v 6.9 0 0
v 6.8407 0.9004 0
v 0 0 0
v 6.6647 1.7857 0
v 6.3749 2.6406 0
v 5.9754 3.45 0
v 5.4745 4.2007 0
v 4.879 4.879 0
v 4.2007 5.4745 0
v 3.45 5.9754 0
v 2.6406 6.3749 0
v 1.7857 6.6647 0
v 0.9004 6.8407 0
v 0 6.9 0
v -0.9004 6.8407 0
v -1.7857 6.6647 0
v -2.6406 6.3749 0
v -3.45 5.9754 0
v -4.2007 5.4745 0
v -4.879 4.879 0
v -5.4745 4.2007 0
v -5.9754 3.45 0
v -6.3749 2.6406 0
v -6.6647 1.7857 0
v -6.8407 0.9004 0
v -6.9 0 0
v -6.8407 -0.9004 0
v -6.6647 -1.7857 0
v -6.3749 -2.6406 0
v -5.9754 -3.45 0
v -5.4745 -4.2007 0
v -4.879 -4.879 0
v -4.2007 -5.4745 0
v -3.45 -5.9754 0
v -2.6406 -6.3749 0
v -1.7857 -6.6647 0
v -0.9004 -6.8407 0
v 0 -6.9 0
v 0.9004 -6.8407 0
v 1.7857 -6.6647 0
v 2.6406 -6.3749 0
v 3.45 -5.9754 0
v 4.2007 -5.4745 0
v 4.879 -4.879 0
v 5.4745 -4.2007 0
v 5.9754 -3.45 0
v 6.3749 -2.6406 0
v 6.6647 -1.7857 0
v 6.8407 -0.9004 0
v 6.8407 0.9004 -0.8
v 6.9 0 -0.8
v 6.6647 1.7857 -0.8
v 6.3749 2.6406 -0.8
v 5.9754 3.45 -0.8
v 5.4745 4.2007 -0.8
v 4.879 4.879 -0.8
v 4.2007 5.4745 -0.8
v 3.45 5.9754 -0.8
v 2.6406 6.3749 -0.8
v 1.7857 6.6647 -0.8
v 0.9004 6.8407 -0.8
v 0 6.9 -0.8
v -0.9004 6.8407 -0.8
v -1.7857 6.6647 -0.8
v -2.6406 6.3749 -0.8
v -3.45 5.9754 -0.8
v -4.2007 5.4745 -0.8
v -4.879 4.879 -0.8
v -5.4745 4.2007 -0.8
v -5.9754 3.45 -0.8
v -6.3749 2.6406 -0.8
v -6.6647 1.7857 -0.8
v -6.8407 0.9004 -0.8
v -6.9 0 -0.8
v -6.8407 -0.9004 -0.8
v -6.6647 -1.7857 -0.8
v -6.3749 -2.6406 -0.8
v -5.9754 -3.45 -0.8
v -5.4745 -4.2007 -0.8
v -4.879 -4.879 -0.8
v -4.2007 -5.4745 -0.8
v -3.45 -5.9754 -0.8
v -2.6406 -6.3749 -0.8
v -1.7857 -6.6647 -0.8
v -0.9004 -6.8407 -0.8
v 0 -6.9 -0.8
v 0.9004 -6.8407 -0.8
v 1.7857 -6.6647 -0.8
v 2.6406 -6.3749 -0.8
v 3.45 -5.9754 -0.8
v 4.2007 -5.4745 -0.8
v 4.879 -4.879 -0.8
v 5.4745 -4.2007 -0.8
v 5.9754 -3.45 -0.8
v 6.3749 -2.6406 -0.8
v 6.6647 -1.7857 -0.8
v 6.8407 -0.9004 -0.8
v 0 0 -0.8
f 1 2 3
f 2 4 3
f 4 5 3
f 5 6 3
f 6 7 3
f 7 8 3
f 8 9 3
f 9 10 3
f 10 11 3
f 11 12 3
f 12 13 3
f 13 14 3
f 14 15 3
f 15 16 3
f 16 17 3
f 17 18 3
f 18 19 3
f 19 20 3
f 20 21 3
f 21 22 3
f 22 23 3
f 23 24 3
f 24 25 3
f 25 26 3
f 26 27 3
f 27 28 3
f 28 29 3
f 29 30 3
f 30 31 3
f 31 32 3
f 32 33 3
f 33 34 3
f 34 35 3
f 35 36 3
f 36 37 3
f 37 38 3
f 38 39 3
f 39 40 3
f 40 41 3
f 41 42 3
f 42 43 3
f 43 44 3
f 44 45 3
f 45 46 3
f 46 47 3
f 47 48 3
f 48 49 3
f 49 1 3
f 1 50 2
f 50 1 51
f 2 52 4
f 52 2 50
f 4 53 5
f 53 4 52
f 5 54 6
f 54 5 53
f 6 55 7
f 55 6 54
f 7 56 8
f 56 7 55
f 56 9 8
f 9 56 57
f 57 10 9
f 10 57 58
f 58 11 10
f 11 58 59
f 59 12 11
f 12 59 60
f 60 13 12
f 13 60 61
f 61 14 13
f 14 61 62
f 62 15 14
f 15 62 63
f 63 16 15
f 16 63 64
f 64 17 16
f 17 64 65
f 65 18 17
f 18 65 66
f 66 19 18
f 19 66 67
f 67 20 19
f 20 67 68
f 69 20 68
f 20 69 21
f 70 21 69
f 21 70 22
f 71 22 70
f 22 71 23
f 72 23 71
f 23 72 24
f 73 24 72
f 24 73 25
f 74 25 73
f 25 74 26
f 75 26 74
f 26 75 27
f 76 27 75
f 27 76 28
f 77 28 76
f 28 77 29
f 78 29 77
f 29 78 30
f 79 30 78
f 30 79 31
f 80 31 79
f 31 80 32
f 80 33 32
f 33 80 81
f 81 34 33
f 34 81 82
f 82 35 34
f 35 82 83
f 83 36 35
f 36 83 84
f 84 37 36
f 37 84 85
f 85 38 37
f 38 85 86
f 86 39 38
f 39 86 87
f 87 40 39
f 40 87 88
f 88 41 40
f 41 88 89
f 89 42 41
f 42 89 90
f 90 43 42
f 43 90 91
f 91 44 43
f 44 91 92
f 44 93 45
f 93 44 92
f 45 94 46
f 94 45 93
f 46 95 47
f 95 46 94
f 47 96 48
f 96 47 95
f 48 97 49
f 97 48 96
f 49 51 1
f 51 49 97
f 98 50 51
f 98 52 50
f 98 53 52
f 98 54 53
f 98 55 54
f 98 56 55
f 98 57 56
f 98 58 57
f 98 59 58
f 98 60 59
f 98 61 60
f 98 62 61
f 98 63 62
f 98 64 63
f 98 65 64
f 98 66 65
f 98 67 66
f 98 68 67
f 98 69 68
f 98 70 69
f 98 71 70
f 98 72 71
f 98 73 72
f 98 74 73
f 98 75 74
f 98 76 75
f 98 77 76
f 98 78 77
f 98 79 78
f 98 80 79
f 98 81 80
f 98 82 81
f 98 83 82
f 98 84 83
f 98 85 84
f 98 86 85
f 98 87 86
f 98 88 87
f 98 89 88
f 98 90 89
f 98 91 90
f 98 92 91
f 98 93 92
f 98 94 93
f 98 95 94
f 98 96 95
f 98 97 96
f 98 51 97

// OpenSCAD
// file: ../p/48/1-4edge.scad
use <../../lib.scad>
function ldraw_lib__48__1_4edge() = [
// 0 Hi-Res Circle 0.25
// 0 Name: 48\1-4edge.dat
// 0 Author: Manfred Moolhuysen
// 0 !LDRAW_ORG 48_Primitive UPDATE 2010-02
// 0 !LICENSE Licensed under CC BY 2.0 and CC BY 4.0 : see CAreadme.txt
// 
// 0 BFC CERTIFY CCW
  [0,"BFC","CERTIFY"],
  [0,"BFC","CCW"],
// 
// 0 !HISTORY 1999-07-05 [PTadmin] Official Update 1999-05
// 0 !HISTORY 2007-06-24 [PTadmin] Header formatted for Contributor Agreement
// 0 !HISTORY 2008-07-01 [PTadmin] Official Update 2008-01
// 0 !HISTORY 2010-03-17 [MagFors] Updated description
// 0 !HISTORY 2010-05-21 [mikeheide] BFC'ed and compacted numbers (saved 10% filesize)
// 0 !HISTORY 2010-07-05 [PTadmin] Official Update 2010-02
// 
// 
// 2 24 1 0 0 0.9914 0 0.1305
  [2,24,1,0,0,0.9914,0,0.1305],
// 2 24 0.9914 0 0.1305 0.9659 0 0.2588
  [2,24,0.9914,0,0.1305,0.9659,0,0.2588],
// 2 24 0.9659 0 0.2588 0.9239 0 0.3827
  [2,24,0.9659,0,0.2588,0.9239,0,0.3827],
// 2 24 0.9239 0 0.3827 0.866 0 0.5
  [2,24,0.9239,0,0.3827,0.866,0,0.5],
// 2 24 0.866 0 0.5 0.7934 0 0.6088
  [2,24,0.866,0,0.5,0.7934,0,0.6088],
// 2 24 0.7934 0 0.6088 0.7071 0 0.7071
  [2,24,0.7934,0,0.6088,0.7071,0,0.7071],
// 2 24 0.7071 0 0.7071 0.6088 0 0.7934
  [2,24,0.7071,0,0.7071,0.6088,0,0.7934],
// 2 24 0.6088 0 0.7934 0.5 0 0.866
  [2,24,0.6088,0,0.7934,0.5,0,0.866],
// 2 24 0.5 0 0.866 0.3827 0 0.9239
  [2,24,0.5,0,0.866,0.3827,0,0.9239],
// 2 24 0.3827 0 0.9239 0.2588 0 0.9659
  [2,24,0.3827,0,0.9239,0.2588,0,0.9659],
// 2 24 0.2588 0 0.9659 0.1305 0 0.9914
  [2,24,0.2588,0,0.9659,0.1305,0,0.9914],
// 2 24 0.1305 0 0.9914 0 0 1
  [2,24,0.1305,0,0.9914,0,0,1],
// 0 //
];
makepoly(ldraw_lib__48__1_4edge(), line=0.2);
// file: ../p/48/1-4cyli.scad
use <../../lib.scad>
function ldraw_lib__48__1_4cyli() = [
// 0 Hi-Res Cylinder 0.25
// 0 Name: 48\1-4cyli.dat
// 0 Author: Manfred Moolhuysen
// 0 !LDRAW_ORG 48_Primitive UPDATE 2009-01
// 0 !LICENSE Licensed under CC BY 2.0 and CC BY 4.0 : see CAreadme.txt
// 
// 0 BFC CERTIFY CCW
  [0,"BFC","CERTIFY"],
  [0,"BFC","CCW"],
// 
// 0 !HISTORY 1999-07-05 [PTadmin] Official Update 1999-05
// 0 !HISTORY 2002-02-28 [hafhead] Added BFC statement
// 0 !HISTORY 2002-04-25 [PTadmin] Official Update 2002-02
// 0 !HISTORY 2007-06-24 [PTadmin] Header formatted for Contributor Agreement
// 0 !HISTORY 2008-07-01 [PTadmin] Official Update 2008-01
// 0 !HISTORY 2008-07-07 [guyvivan] Made BFC'ed CCW (2005-12-06)
// 0 !HISTORY 2009-05-02 [PTadmin] Official Update 2009-01
// 
// 
// 4 16 0.9914 0 0.1305 1 0 0 1 1 0 0.9914 1 0.1305
  [4,16,0.9914,0,0.1305,1,0,0,1,1,0,0.9914,1,0.1305],
// 4 16 0.9659 0 0.2588 0.9914 0 0.1305 0.9914 1 0.1305 0.9659 1 0.2588
  [4,16,0.9659,0,0.2588,0.9914,0,0.1305,0.9914,1,0.1305,0.9659,1,0.2588],
// 4 16 0.9239 0 0.3827 0.9659 0 0.2588 0.9659 1 0.2588 0.9239 1 0.3827
  [4,16,0.9239,0,0.3827,0.9659,0,0.2588,0.9659,1,0.2588,0.9239,1,0.3827],
// 4 16 0.866 0 0.5 0.9239 0 0.3827 0.9239 1 0.3827 0.866 1 0.5
  [4,16,0.866,0,0.5,0.9239,0,0.3827,0.9239,1,0.3827,0.866,1,0.5],
// 4 16 0.7934 0 0.6088 0.866 0 0.5 0.866 1 0.5 0.7934 1 0.6088
  [4,16,0.7934,0,0.6088,0.866,0,0.5,0.866,1,0.5,0.7934,1,0.6088],
// 4 16 0.7071 0 0.7071 0.7934 0 0.6088 0.7934 1 0.6088 0.7071 1 0.7071
  [4,16,0.7071,0,0.7071,0.7934,0,0.6088,0.7934,1,0.6088,0.7071,1,0.7071],
// 4 16 0.6088 0 0.7934 0.7071 0 0.7071 0.7071 1 0.7071 0.6088 1 0.7934
  [4,16,0.6088,0,0.7934,0.7071,0,0.7071,0.7071,1,0.7071,0.6088,1,0.7934],
// 4 16 0.5 0 0.866 0.6088 0 0.7934 0.6088 1 0.7934 0.5 1 0.866
  [4,16,0.5,0,0.866,0.6088,0,0.7934,0.6088,1,0.7934,0.5,1,0.866],
// 4 16 0.3827 0 0.9239 0.5 0 0.866 0.5 1 0.866 0.3827 1 0.9239
  [4,16,0.3827,0,0.9239,0.5,0,0.866,0.5,1,0.866,0.3827,1,0.9239],
// 4 16 0.2588 0 0.9659 0.3827 0 0.9239 0.3827 1 0.9239 0.2588 1 0.9659
  [4,16,0.2588,0,0.9659,0.3827,0,0.9239,0.3827,1,0.9239,0.2588,1,0.9659],
// 4 16 0.1305 0 0.9914 0.2588 0 0.9659 0.2588 1 0.9659 0.1305 1 0.9914
  [4,16,0.1305,0,0.9914,0.2588,0,0.9659,0.2588,1,0.9659,0.1305,1,0.9914],
// 4 16 0 0 1 0.1305 0 0.9914 0.1305 1 0.9914 0 1 1
  [4,16,0,0,1,0.1305,0,0.9914,0.1305,1,0.9914,0,1,1],
// 
// 0 conditional lines
// 5 24 1 1 0 1 0 0 1 1 -1 0.9914 1 0.1305
  [5,24,1,1,0,1,0,0,1,1,-1,0.9914,1,0.1305],
// 5 24 0.9914 1 0.1305 0.9914 0 0.1305 1 1 0 0.9659 1 0.2588
  [5,24,0.9914,1,0.1305,0.9914,0,0.1305,1,1,0,0.9659,1,0.2588],
// 5 24 0.9659 1 0.2588 0.9659 0 0.2588 0.9914 1 0.1305 0.9239 1 0.3827
  [5,24,0.9659,1,0.2588,0.9659,0,0.2588,0.9914,1,0.1305,0.9239,1,0.3827],
// 5 24 0.9239 1 0.3827 0.9239 0 0.3827 0.9659 1 0.2588 0.866 1 0.5
  [5,24,0.9239,1,0.3827,0.9239,0,0.3827,0.9659,1,0.2588,0.866,1,0.5],
// 5 24 0.866 1 0.5 0.866 0 0.5 0.9239 1 0.3827 0.7934 1 0.6088
  [5,24,0.866,1,0.5,0.866,0,0.5,0.9239,1,0.3827,0.7934,1,0.6088],
// 5 24 0.7934 1 0.6088 0.7934 0 0.6088 0.866 1 0.5 0.7071 1 0.7071
  [5,24,0.7934,1,0.6088,0.7934,0,0.6088,0.866,1,0.5,0.7071,1,0.7071],
// 5 24 0.7071 1 0.7071 0.7071 0 0.7071 0.7934 1 0.6088 0.6088 1 0.7934
  [5,24,0.7071,1,0.7071,0.7071,0,0.7071,0.7934,1,0.6088,0.6088,1,0.7934],
// 5 24 0.6088 1 0.7934 0.6088 0 0.7934 0.7071 1 0.7071 0.5 1 0.866
  [5,24,0.6088,1,0.7934,0.6088,0,0.7934,0.7071,1,0.7071,0.5,1,0.866],
// 5 24 0.5 1 0.866 0.5 0 0.866 0.6088 1 0.7934 0.3827 1 0.9239
  [5,24,0.5,1,0.866,0.5,0,0.866,0.6088,1,0.7934,0.3827,1,0.9239],
// 5 24 0.3827 1 0.9239 0.3827 0 0.9239 0.5 1 0.866 0.2588 1 0.9659
  [5,24,0.3827,1,0.9239,0.3827,0,0.9239,0.5,1,0.866,0.2588,1,0.9659],
// 5 24 0.2588 1 0.9659 0.2588 0 0.9659 0.3827 1 0.9239 0.1305 1 0.9914
  [5,24,0.2588,1,0.9659,0.2588,0,0.9659,0.3827,1,0.9239,0.1305,1,0.9914],
// 5 24 0.1305 1 0.9914 0.1305 0 0.9914 0.2588 1 0.9659 0 1 1
  [5,24,0.1305,1,0.9914,0.1305,0,0.9914,0.2588,1,0.9659,0,1,1],
// 5 24 0 1 1 0 0 1 0.1305 1 0.9914 -1 1 1
  [5,24,0,1,1,0,0,1,0.1305,1,0.9914,-1,1,1],
// 
// 0 end of file
];
makepoly(ldraw_lib__48__1_4cyli(), line=0.2);
// file: ../p/48/4-4edge.scad
use <../../lib.scad>
use <1-4edge.scad>
function ldraw_lib__48__4_4edge() = [
// 0 Hi-Res Circle 1.0
// 0 Name: 48\4-4edge.dat
// 0 Author: Paul Easter [pneaster]
// 0 !LDRAW_ORG 48_Primitive UPDATE 2012-01
// 0 !LICENSE Licensed under CC BY 2.0 and CC BY 4.0 : see CAreadme.txt
// 
// 0 BFC CERTIFY CCW
  [0,"BFC","CERTIFY"],
  [0,"BFC","CCW"],
// 
// 0 !HISTORY 2002-08-18 [PTadmin] Official Update 2002-04
// 0 !HISTORY 2007-06-24 [PTadmin] Header formatted for Contributor Agreement
// 0 !HISTORY 2008-07-01 [PTadmin] Official Update 2008-01
// 0 !HISTORY 2012-01-15 [MagFors] BFC'ed, title changed from Edge to Circle
// 0 !HISTORY 2012-03-30 [PTadmin] Official Update 2012-01
// 
// 
// 1 16 0 0 0 1 0 0 0 1 0 0 0 1 48\1-4edge.dat
  [1,16,0,0,0,1,0,0,0,1,0,0,0,1, ldraw_lib__48__1_4edge()],
// 1 16 0 0 0 0 0 -1 0 1 0 1 0 0 48\1-4edge.dat
  [1,16,0,0,0,0,0,-1,0,1,0,1,0,0, ldraw_lib__48__1_4edge()],
// 1 16 0 0 0 -1 0 0 0 1 0 0 0 -1 48\1-4edge.dat
  [1,16,0,0,0,-1,0,0,0,1,0,0,0,-1, ldraw_lib__48__1_4edge()],
// 1 16 0 0 0 0 0 1 0 1 0 -1 0 0 48\1-4edge.dat
  [1,16,0,0,0,0,0,1,0,1,0,-1,0,0, ldraw_lib__48__1_4edge()],
// 
];
makepoly(ldraw_lib__48__4_4edge(), line=0.2);
// file: ../p/48/4-4cyli.scad
use <../../lib.scad>
use <1-4cyli.scad>
function ldraw_lib__48__4_4cyli() = [
// 0 Hi-Res Cylinder 1.0
// 0 Name: 48\4-4cyli.dat
// 0 Author: Paul Easter [pneaster]
// 0 !LDRAW_ORG 48_Primitive UPDATE 2012-02
// 0 !LICENSE Licensed under CC BY 2.0 and CC BY 4.0 : see CAreadme.txt
// 
// 0 BFC CERTIFY CCW
  [0,"BFC","CERTIFY"],
  [0,"BFC","CCW"],
// 
// 0 !HISTORY 2002-08-18 [PTadmin] Official Update 2002-04
// 0 !HISTORY 2007-06-24 [PTadmin] Header formatted for Contributor Agreement
// 0 !HISTORY 2008-07-01 [PTadmin] Official Update 2008-01
// 0 !HISTORY 2012-02-27 [Philo] Changed to CCW
// 0 !HISTORY 2012-08-09 [PTadmin] Official Update 2012-02
// 
// 
// 1 16 0 0 0 1 0 0 0 1 0 0 0 1 48\1-4cyli.dat
  [1,16,0,0,0,1,0,0,0,1,0,0,0,1, ldraw_lib__48__1_4cyli()],
// 1 16 0 0 0 0 0 -1 0 1 0 1 0 0 48\1-4cyli.dat
  [1,16,0,0,0,0,0,-1,0,1,0,1,0,0, ldraw_lib__48__1_4cyli()],
// 1 16 0 0 0 -1 0 0 0 1 0 0 0 -1 48\1-4cyli.dat
  [1,16,0,0,0,-1,0,0,0,1,0,0,0,-1, ldraw_lib__48__1_4cyli()],
// 1 16 0 0 0 0 0 1 0 1 0 -1 0 0 48\1-4cyli.dat
  [1,16,0,0,0,0,0,1,0,1,0,-1,0,0, ldraw_lib__48__1_4cyli()],
];
makepoly(ldraw_lib__48__4_4cyli(), line=0.2);
// file: ../p/48/4-4disc.scad
use <../../lib.scad>
function ldraw_lib__48__4_4disc() = [
// 0 Hi-Res Disc 1.0
// 0 Name: 48\4-4disc.dat
// 0 Author: Miklos Hosszu [hmick]
// 0 !LDRAW_ORG 48_Primitive UPDATE 2012-02
// 0 !LICENSE Licensed under CC BY 2.0 and CC BY 4.0 : see CAreadme.txt
// 
// 0 BFC CERTIFY CCW
  [0,"BFC","CERTIFY"],
  [0,"BFC","CCW"],
// 
// 0 !HISTORY 2004-11-06 [PTadmin] Official Update 2004-04
// 0 !HISTORY 2007-06-24 [PTadmin] Header formatted for Contributor Agreement
// 0 !HISTORY 2008-07-01 [PTadmin] Official Update 2008-01
// 0 !HISTORY 2012-02-27 [Philo] Changed to CCW
// 0 !HISTORY 2012-08-09 [PTadmin] Official Update 2012-02
// 
// 
// 3 16 1 0 0 0.9914 0 0.1305 0 0 0
  [3,16,1,0,0,0.9914,0,0.1305,0,0,0],
// 3 16 0.9914 0 0.1305 0.9659 0 0.2588 0 0 0
  [3,16,0.9914,0,0.1305,0.9659,0,0.2588,0,0,0],
// 3 16 0.9659 0 0.2588 0.9239 0 0.3827 0 0 0
  [3,16,0.9659,0,0.2588,0.9239,0,0.3827,0,0,0],
// 3 16 0.9239 0 0.3827 0.866 0 0.5 0 0 0
  [3,16,0.9239,0,0.3827,0.866,0,0.5,0,0,0],
// 3 16 0.866 0 0.5 0.7934 0 0.6088 0 0 0
  [3,16,0.866,0,0.5,0.7934,0,0.6088,0,0,0],
// 3 16 0.7934 0 0.6088 0.7071 0 0.7071 0 0 0
  [3,16,0.7934,0,0.6088,0.7071,0,0.7071,0,0,0],
// 3 16 0.7071 0 0.7071 0.6088 0 0.7934 0 0 0
  [3,16,0.7071,0,0.7071,0.6088,0,0.7934,0,0,0],
// 3 16 0.6088 0 0.7934 0.5 0 0.866 0 0 0
  [3,16,0.6088,0,0.7934,0.5,0,0.866,0,0,0],
// 3 16 0.5 0 0.866 0.3827 0 0.9239 0 0 0
  [3,16,0.5,0,0.866,0.3827,0,0.9239,0,0,0],
// 3 16 0.3827 0 0.9239 0.2588 0 0.9659 0 0 0
  [3,16,0.3827,0,0.9239,0.2588,0,0.9659,0,0,0],
// 3 16 0.2588 0 0.9659 0.1305 0 0.9914 0 0 0
  [3,16,0.2588,0,0.9659,0.1305,0,0.9914,0,0,0],
// 3 16 0.1305 0 0.9914 0 0 1 0 0 0
  [3,16,0.1305,0,0.9914,0,0,1,0,0,0],
// 3 16 0 0 1 -0.1305 0 0.9914 0 0 0
  [3,16,0,0,1,-0.1305,0,0.9914,0,0,0],
// 3 16 -0.1305 0 0.9914 -0.2588 0 0.9659 0 0 0
  [3,16,-0.1305,0,0.9914,-0.2588,0,0.9659,0,0,0],
// 3 16 -0.2588 0 0.9659 -0.3827 0 0.9239 0 0 0
  [3,16,-0.2588,0,0.9659,-0.3827,0,0.9239,0,0,0],
// 3 16 -0.3827 0 0.9239 -0.5 0 0.866 0 0 0
  [3,16,-0.3827,0,0.9239,-0.5,0,0.866,0,0,0],
// 3 16 -0.5 0 0.866 -0.6088 0 0.7934 0 0 0
  [3,16,-0.5,0,0.866,-0.6088,0,0.7934,0,0,0],
// 3 16 -0.6088 0 0.7934 -0.7071 0 0.7071 0 0 0
  [3,16,-0.6088,0,0.7934,-0.7071,0,0.7071,0,0,0],
// 3 16 -0.7071 0 0.7071 -0.7934 0 0.6088 0 0 0
  [3,16,-0.7071,0,0.7071,-0.7934,0,0.6088,0,0,0],
// 3 16 -0.7934 0 0.6088 -0.866 0 0.5 0 0 0
  [3,16,-0.7934,0,0.6088,-0.866,0,0.5,0,0,0],
// 3 16 -0.866 0 0.5 -0.9239 0 0.3827 0 0 0
  [3,16,-0.866,0,0.5,-0.9239,0,0.3827,0,0,0],
// 3 16 -0.9239 0 0.3827 -0.9659 0 0.2588 0 0 0
  [3,16,-0.9239,0,0.3827,-0.9659,0,0.2588,0,0,0],
// 3 16 -0.9659 0 0.2588 -0.9914 0 0.1305 0 0 0
  [3,16,-0.9659,0,0.2588,-0.9914,0,0.1305,0,0,0],
// 3 16 -0.9914 0 0.1305 -1 0 0 0 0 0
  [3,16,-0.9914,0,0.1305,-1,0,0,0,0,0],
// 3 16 -1 0 0 -0.9914 0 -0.1305 0 0 0
  [3,16,-1,0,0,-0.9914,0,-0.1305,0,0,0],
// 3 16 -0.9914 0 -0.1305 -0.9659 0 -0.2588 0 0 0
  [3,16,-0.9914,0,-0.1305,-0.9659,0,-0.2588,0,0,0],
// 3 16 -0.9659 0 -0.2588 -0.9239 0 -0.3827 0 0 0
  [3,16,-0.9659,0,-0.2588,-0.9239,0,-0.3827,0,0,0],
// 3 16 -0.9239 0 -0.3827 -0.866 0 -0.5 0 0 0
  [3,16,-0.9239,0,-0.3827,-0.866,0,-0.5,0,0,0],
// 3 16 -0.866 0 -0.5 -0.7934 0 -0.6088 0 0 0
  [3,16,-0.866,0,-0.5,-0.7934,0,-0.6088,0,0,0],
// 3 16 -0.7934 0 -0.6088 -0.7071 0 -0.7071 0 0 0
  [3,16,-0.7934,0,-0.6088,-0.7071,0,-0.7071,0,0,0],
// 3 16 -0.7071 0 -0.7071 -0.6088 0 -0.7934 0 0 0
  [3,16,-0.7071,0,-0.7071,-0.6088,0,-0.7934,0,0,0],
// 3 16 -0.6088 0 -0.7934 -0.5 0 -0.866 0 0 0
  [3,16,-0.6088,0,-0.7934,-0.5,0,-0.866,0,0,0],
// 3 16 -0.5 0 -0.866 -0.3827 0 -0.9239 0 0 0
  [3,16,-0.5,0,-0.866,-0.3827,0,-0.9239,0,0,0],
// 3 16 -0.3827 0 -0.9239 -0.2588 0 -0.9659 0 0 0
  [3,16,-0.3827,0,-0.9239,-0.2588,0,-0.9659,0,0,0],
// 3 16 -0.2588 0 -0.9659 -0.1305 0 -0.9914 0 0 0
  [3,16,-0.2588,0,-0.9659,-0.1305,0,-0.9914,0,0,0],
// 3 16 -0.1305 0 -0.9914 0 0 -1 0 0 0
  [3,16,-0.1305,0,-0.9914,0,0,-1,0,0,0],
// 3 16 0 0 -1 0.1305 0 -0.9914 0 0 0
  [3,16,0,0,-1,0.1305,0,-0.9914,0,0,0],
// 3 16 0.1305 0 -0.9914 0.2588 0 -0.9659 0 0 0
  [3,16,0.1305,0,-0.9914,0.2588,0,-0.9659,0,0,0],
// 3 16 0.2588 0 -0.9659 0.3827 0 -0.9239 0 0 0
  [3,16,0.2588,0,-0.9659,0.3827,0,-0.9239,0,0,0],
// 3 16 0.3827 0 -0.9239 0.5 0 -0.866 0 0 0
  [3,16,0.3827,0,-0.9239,0.5,0,-0.866,0,0,0],
// 3 16 0.5 0 -0.866 0.6088 0 -0.7934 0 0 0
  [3,16,0.5,0,-0.866,0.6088,0,-0.7934,0,0,0],
// 3 16 0.6088 0 -0.7934 0.7071 0 -0.7071 0 0 0
  [3,16,0.6088,0,-0.7934,0.7071,0,-0.7071,0,0,0],
// 3 16 0.7071 0 -0.7071 0.7934 0 -0.6088 0 0 0
  [3,16,0.7071,0,-0.7071,0.7934,0,-0.6088,0,0,0],
// 3 16 0.7934 0 -0.6088 0.866 0 -0.5 0 0 0
  [3,16,0.7934,0,-0.6088,0.866,0,-0.5,0,0,0],
// 3 16 0.866 0 -0.5 0.9239 0 -0.3827 0 0 0
  [3,16,0.866,0,-0.5,0.9239,0,-0.3827,0,0,0],
// 3 16 0.9239 0 -0.3827 0.9659 0 -0.2588 0 0 0
  [3,16,0.9239,0,-0.3827,0.9659,0,-0.2588,0,0,0],
// 3 16 0.9659 0 -0.2588 0.9914 0 -0.1305 0 0 0
  [3,16,0.9659,0,-0.2588,0.9914,0,-0.1305,0,0,0],
// 3 16 0.9914 0 -0.1305 1 0 0 0 0 0
  [3,16,0.9914,0,-0.1305,1,0,0,0,0,0],
];
makepoly(ldraw_lib__48__4_4disc(), line=0.2);
// file: ../p/48/4-4cylc.scad
use <../../lib.scad>
use <4-4cyli.scad>
use <4-4disc.scad>
use <4-4edge.scad>
function ldraw_lib__48__4_4cylc() = [
// 0 Hi-Res Cylinder Closed 1.0
// 0 Name: 48\4-4cylc.dat
// 0 Author: Alex Taylor [anathema]
// 0 !LDRAW_ORG 48_Primitive UPDATE 2010-02
// 0 !LICENSE Licensed under CC BY 2.0 and CC BY 4.0 : see CAreadme.txt
// 
// 0 BFC CERTIFY CCW
  [0,"BFC","CERTIFY"],
  [0,"BFC","CCW"],
// 
// 0 !HISTORY 2008-12-31 [cwdee] Removed one disc
// 0 !HISTORY 2010-07-05 [PTadmin] Official Update 2010-02
// 
// 
// 1 16 0 0 0 1 0 0 0 1 0 0 0 1 48\4-4edge.dat
  [1,16,0,0,0,1,0,0,0,1,0,0,0,1, ldraw_lib__48__4_4edge()],
// 1 16 0 1 0 1 0 0 0 1 0 0 0 1 48\4-4edge.dat
  [1,16,0,1,0,1,0,0,0,1,0,0,0,1, ldraw_lib__48__4_4edge()],
// 1 16 0 0 0 1 0 0 0 1 0 0 0 1 48\4-4disc.dat
  [1,16,0,0,0,1,0,0,0,1,0,0,0,1, ldraw_lib__48__4_4disc()],
// 1 16 0 0 0 1 0 0 0 1 0 0 0 1 48\4-4cyli.dat
  [1,16,0,0,0,1,0,0,0,1,0,0,0,1, ldraw_lib__48__4_4cyli()],
// 0
];
makepoly(ldraw_lib__48__4_4cylc(), line=0.2);
// main file
use <../lib.scad>
use <../p/48/4-4cylc.scad>
use <../p/48/4-4disc.scad>
function ldraw_lib__u9396() = [
// 0 ~Electric Powered Up 6 Port Hub On Button
// 0 Name: u9396.dat
// 0 Author: Philippe Hurbain [Philo]
// 0 !LDRAW_ORG Part UPDATE 2020-03
// 0 !LICENSE Licensed under CC BY 2.0 and CC BY 4.0 : see CAreadme.txt
// 
// 0 BFC CERTIFY CCW
  [0,"BFC","CERTIFY"],
  [0,"BFC","CCW"],
// 
// 0 !KEYWORDS Mindstorms, Robotic Inventor, Spike Prime
// 
// 0 !HISTORY 2019-06-28 [PTadmin] Official Update 2019-01
// 0 !HISTORY 2020-12-27 [PTadmin] Update description
// 0 !HISTORY 2020-12-29 [PTadmin] Official Update 2020-03
// 
// 
// 1 16 0 0 0 17.25 0 0 0 2 0 0 0 17.25 48\4-4cylc.dat
  [1,16,0,0,0,17.25,0,0,0,2,0,0,0,17.25, ldraw_lib__48__4_4cylc()],
// 1 16 0 2 0 17.25 0 0 0 -2 0 0 0 17.25 48\4-4disc.dat
  [1,16,0,2,0,17.25,0,0,0,-2,0,0,0,17.25, ldraw_lib__48__4_4disc()],
];
makepoly(ldraw_lib__u9396(), line=0.2);
